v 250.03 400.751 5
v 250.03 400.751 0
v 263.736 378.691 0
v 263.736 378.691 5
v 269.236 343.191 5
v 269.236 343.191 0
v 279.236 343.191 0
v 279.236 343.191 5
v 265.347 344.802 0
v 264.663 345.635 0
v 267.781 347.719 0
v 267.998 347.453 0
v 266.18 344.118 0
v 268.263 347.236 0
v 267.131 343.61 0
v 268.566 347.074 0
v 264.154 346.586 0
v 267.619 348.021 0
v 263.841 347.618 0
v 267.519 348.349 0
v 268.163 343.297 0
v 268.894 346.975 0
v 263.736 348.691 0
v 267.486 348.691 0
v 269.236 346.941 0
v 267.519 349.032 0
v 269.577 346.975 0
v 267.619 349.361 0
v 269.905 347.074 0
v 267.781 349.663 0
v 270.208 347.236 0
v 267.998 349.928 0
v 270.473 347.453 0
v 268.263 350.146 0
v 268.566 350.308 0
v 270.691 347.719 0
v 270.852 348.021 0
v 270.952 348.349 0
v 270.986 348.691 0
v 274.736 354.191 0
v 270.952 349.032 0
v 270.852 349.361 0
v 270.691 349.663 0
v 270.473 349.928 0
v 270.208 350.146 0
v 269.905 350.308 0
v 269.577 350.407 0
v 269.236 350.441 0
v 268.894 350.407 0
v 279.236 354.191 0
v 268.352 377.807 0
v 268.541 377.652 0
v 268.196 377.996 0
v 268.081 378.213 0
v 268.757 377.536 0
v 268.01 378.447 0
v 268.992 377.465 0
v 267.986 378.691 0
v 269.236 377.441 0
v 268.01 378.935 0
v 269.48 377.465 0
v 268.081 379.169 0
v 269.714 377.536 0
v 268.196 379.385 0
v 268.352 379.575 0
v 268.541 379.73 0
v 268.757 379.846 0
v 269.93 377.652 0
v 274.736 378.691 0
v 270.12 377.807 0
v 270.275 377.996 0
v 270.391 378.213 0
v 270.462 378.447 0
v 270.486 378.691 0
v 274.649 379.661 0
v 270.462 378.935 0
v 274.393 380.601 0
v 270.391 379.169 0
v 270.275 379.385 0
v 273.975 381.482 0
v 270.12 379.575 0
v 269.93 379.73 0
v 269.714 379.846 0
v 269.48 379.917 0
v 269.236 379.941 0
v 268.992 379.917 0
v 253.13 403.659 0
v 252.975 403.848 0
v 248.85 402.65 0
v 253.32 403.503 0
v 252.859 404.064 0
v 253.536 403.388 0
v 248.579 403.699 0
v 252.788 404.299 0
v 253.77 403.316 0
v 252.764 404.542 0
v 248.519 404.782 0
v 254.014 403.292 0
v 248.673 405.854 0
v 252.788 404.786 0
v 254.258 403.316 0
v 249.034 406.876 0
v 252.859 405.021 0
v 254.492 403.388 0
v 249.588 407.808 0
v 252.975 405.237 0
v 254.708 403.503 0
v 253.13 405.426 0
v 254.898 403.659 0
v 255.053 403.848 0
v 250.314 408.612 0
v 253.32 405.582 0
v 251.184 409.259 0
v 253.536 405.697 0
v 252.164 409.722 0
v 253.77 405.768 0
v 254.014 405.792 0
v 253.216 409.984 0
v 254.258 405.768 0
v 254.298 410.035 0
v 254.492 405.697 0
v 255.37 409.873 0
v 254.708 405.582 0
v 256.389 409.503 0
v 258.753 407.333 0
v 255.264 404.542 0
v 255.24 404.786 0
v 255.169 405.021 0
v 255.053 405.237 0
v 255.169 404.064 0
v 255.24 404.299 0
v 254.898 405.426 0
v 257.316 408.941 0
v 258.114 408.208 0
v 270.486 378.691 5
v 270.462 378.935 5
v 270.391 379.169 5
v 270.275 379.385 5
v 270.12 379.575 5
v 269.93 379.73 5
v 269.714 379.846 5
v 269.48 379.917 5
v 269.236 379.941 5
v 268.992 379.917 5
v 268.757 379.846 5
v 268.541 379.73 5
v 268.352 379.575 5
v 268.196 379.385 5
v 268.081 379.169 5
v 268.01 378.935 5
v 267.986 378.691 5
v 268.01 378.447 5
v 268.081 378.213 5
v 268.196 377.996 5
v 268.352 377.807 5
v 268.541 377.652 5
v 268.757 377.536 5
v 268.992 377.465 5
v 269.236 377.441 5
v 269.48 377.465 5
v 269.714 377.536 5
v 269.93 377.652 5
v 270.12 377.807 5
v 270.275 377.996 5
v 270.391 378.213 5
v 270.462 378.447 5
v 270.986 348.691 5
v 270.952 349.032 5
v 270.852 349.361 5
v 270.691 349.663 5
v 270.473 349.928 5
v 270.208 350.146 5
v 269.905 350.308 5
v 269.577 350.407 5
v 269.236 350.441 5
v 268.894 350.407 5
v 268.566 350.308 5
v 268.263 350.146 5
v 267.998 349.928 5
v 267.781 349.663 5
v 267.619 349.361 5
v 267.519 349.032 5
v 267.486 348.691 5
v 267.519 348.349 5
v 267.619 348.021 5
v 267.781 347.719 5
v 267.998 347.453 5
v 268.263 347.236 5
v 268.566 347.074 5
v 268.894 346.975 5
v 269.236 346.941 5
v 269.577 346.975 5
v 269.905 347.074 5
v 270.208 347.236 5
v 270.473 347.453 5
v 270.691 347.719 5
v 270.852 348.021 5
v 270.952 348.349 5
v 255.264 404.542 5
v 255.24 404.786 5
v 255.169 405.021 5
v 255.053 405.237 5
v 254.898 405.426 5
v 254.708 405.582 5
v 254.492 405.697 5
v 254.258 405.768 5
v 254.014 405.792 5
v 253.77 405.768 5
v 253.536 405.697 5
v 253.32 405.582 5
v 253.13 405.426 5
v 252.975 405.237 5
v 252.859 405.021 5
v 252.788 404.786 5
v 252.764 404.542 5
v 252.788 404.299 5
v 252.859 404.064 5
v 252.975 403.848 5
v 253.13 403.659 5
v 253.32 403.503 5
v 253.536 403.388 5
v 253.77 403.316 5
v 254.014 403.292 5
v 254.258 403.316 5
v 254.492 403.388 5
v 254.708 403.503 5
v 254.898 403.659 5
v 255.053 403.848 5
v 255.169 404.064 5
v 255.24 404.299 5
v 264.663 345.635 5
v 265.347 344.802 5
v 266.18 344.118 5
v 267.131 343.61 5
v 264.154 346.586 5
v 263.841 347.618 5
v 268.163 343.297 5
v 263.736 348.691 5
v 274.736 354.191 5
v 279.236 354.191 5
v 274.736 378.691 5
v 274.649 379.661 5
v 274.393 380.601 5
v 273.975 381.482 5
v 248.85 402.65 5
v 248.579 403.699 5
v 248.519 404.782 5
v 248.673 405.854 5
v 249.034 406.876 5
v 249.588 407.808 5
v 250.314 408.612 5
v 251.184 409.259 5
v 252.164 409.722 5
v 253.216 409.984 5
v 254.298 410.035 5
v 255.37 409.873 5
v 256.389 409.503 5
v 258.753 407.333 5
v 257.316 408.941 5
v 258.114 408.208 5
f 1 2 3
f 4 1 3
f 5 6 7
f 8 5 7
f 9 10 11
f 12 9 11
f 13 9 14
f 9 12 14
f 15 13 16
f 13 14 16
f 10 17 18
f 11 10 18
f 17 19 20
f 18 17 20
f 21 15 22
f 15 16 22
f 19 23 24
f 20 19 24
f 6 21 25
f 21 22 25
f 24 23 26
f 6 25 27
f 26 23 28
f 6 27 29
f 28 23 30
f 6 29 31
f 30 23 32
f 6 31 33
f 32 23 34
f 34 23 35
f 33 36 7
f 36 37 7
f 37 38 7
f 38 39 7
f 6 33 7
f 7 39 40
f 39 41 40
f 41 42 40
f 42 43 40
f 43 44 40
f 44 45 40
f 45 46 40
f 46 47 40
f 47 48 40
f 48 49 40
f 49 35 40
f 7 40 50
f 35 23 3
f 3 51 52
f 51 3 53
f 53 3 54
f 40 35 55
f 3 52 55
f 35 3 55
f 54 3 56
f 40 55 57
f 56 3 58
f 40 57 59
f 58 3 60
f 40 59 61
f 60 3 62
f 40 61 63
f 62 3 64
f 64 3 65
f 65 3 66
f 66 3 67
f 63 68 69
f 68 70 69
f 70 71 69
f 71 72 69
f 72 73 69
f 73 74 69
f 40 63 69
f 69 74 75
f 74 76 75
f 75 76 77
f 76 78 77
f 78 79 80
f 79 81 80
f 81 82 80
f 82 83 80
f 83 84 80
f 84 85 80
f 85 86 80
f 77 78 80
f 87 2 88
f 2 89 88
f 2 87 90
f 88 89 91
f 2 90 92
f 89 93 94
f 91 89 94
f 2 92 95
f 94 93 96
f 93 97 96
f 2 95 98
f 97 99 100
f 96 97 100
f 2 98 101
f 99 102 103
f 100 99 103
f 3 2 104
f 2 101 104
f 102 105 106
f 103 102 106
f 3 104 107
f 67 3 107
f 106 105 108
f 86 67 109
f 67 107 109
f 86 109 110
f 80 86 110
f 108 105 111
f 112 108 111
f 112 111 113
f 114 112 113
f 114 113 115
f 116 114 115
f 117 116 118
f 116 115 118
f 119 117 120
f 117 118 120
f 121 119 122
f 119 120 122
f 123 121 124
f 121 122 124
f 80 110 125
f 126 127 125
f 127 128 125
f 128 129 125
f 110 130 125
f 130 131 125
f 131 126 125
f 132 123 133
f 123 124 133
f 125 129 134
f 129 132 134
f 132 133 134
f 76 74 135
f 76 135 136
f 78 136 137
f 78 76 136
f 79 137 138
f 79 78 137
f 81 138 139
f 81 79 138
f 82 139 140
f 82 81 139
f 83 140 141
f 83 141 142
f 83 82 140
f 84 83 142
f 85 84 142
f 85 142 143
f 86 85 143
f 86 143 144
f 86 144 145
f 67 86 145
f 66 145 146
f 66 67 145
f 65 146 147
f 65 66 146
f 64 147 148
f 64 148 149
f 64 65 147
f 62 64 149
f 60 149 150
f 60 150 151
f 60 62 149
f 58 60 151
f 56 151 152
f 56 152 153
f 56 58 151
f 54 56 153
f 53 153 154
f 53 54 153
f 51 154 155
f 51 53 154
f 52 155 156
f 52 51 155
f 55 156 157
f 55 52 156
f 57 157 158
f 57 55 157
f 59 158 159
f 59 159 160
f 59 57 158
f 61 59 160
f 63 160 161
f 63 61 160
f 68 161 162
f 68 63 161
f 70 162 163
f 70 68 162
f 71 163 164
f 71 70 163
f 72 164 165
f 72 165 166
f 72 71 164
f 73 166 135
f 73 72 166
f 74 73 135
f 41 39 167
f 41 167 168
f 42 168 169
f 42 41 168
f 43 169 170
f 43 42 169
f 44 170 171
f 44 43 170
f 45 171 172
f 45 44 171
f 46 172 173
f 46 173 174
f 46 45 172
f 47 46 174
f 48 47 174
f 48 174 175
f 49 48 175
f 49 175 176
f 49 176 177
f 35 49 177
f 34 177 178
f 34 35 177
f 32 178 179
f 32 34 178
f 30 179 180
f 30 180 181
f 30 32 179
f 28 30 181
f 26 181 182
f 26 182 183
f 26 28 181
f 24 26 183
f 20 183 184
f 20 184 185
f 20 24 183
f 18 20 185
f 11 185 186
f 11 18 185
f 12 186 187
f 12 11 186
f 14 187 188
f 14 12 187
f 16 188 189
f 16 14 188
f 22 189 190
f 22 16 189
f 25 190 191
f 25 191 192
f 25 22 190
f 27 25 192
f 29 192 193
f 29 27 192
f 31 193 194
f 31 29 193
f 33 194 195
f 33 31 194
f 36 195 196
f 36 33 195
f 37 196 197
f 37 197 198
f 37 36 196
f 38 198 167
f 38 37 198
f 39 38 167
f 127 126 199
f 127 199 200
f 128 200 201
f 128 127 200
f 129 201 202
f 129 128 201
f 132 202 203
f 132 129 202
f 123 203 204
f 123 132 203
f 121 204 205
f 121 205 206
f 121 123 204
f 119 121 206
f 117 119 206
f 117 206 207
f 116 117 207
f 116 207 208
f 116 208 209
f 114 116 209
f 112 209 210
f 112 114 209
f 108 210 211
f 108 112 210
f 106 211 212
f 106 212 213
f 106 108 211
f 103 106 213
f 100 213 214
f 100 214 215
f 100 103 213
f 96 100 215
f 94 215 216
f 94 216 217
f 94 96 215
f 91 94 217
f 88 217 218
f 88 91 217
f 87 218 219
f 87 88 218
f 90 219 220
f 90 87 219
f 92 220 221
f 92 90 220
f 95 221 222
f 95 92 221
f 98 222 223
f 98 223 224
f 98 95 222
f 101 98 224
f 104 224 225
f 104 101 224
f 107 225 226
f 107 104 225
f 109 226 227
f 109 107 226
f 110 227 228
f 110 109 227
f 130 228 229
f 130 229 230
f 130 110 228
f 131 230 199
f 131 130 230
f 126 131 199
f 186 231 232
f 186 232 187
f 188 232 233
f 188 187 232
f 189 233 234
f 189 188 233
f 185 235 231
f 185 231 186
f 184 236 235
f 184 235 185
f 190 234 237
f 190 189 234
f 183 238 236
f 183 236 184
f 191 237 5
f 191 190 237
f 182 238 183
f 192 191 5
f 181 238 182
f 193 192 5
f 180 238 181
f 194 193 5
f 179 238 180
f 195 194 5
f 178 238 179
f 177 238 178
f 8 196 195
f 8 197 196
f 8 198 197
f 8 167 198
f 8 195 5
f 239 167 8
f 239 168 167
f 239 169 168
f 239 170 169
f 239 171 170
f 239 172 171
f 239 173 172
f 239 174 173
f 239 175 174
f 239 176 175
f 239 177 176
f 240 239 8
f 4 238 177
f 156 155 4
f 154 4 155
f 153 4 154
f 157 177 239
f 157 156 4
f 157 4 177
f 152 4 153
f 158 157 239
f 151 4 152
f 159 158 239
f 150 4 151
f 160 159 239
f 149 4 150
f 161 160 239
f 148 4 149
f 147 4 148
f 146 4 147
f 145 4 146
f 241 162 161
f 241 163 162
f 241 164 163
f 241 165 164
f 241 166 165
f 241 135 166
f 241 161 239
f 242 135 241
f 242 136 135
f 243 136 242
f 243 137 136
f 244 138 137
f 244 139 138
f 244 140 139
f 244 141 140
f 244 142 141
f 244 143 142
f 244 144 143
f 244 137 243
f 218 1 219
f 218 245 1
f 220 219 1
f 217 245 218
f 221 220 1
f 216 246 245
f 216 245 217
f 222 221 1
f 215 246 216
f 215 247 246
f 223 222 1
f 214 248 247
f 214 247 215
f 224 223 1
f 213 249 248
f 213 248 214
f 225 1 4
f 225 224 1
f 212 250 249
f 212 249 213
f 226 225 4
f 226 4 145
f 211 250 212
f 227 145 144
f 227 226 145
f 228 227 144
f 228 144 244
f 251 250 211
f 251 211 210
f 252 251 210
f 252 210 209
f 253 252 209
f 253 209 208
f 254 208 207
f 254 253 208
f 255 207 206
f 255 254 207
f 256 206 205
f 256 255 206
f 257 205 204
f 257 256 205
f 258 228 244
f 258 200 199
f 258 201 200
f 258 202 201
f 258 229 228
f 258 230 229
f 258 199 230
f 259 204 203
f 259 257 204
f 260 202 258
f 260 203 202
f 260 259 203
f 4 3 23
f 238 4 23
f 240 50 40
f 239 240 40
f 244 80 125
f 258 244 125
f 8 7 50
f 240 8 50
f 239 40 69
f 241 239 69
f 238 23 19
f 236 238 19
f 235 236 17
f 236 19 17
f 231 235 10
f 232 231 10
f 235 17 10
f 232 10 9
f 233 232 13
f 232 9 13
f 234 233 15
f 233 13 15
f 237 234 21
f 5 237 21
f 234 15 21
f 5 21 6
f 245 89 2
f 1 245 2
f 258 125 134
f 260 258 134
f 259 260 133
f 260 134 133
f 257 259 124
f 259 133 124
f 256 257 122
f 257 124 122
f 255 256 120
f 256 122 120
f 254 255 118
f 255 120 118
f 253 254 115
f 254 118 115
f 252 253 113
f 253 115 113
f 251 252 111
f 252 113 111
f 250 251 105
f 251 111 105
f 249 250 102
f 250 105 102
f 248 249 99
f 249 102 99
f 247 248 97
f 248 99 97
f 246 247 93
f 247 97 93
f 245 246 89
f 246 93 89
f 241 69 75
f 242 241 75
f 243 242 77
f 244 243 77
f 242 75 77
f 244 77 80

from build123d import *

# Parameters (mm, degrees)
SKETCH1_R           = 1.75
SKETCH1_R_2         = 1.25
BOSS_EXTRUDE1_DEPTH = 5


with BuildPart() as part:
    # Sketch1 → Boss-Extrude1 (new body)
    with BuildSketch(Plane.XY):
        with BuildLine():
            Line((274.735652315, 354.190888595), (274.735652315, 378.690888595))
            ThreePointArc((274.735652315, 378.690888595), (274.542108821, 380.137097205), (273.975099827, 381.481522444))
            Line((273.975099827, 381.481522444), (258.753460649, 407.333054329))
            ThreePointArc((258.753460649, 407.333054329), (251.662864877, 409.514553006), (248.849842147, 402.649978145))
            Line((248.849842147, 402.649978145), (250.029730466, 400.750917928))
            Line((250.029730466, 400.750917928), (263.735652315, 378.690888595))
            Line((263.735652315, 378.690888595), (263.735652315, 348.690888595))
            ThreePointArc((263.735652315, 348.690888595), (265.346565018, 344.801801299), (269.235652315, 343.190888595))
            Line((269.235652315, 343.190888595), (279.235652315, 343.190888595))
            Line((279.235652315, 343.190888595), (279.235652315, 354.190888595))
            Line((279.235652315, 354.190888595), (274.735652315, 354.190888595))
        make_face()
        with Locations((269.235652315, 348.690888595)):
            Circle(SKETCH1_R, mode=Mode.SUBTRACT)
        with Locations((254.014013137, 404.542420479)):
            Circle(SKETCH1_R_2, mode=Mode.SUBTRACT)
        with Locations((269.235652315, 378.690888595)):
            Circle(SKETCH1_R_2, mode=Mode.SUBTRACT)
    extrude(amount=BOSS_EXTRUDE1_DEPTH)


solid = part.part
